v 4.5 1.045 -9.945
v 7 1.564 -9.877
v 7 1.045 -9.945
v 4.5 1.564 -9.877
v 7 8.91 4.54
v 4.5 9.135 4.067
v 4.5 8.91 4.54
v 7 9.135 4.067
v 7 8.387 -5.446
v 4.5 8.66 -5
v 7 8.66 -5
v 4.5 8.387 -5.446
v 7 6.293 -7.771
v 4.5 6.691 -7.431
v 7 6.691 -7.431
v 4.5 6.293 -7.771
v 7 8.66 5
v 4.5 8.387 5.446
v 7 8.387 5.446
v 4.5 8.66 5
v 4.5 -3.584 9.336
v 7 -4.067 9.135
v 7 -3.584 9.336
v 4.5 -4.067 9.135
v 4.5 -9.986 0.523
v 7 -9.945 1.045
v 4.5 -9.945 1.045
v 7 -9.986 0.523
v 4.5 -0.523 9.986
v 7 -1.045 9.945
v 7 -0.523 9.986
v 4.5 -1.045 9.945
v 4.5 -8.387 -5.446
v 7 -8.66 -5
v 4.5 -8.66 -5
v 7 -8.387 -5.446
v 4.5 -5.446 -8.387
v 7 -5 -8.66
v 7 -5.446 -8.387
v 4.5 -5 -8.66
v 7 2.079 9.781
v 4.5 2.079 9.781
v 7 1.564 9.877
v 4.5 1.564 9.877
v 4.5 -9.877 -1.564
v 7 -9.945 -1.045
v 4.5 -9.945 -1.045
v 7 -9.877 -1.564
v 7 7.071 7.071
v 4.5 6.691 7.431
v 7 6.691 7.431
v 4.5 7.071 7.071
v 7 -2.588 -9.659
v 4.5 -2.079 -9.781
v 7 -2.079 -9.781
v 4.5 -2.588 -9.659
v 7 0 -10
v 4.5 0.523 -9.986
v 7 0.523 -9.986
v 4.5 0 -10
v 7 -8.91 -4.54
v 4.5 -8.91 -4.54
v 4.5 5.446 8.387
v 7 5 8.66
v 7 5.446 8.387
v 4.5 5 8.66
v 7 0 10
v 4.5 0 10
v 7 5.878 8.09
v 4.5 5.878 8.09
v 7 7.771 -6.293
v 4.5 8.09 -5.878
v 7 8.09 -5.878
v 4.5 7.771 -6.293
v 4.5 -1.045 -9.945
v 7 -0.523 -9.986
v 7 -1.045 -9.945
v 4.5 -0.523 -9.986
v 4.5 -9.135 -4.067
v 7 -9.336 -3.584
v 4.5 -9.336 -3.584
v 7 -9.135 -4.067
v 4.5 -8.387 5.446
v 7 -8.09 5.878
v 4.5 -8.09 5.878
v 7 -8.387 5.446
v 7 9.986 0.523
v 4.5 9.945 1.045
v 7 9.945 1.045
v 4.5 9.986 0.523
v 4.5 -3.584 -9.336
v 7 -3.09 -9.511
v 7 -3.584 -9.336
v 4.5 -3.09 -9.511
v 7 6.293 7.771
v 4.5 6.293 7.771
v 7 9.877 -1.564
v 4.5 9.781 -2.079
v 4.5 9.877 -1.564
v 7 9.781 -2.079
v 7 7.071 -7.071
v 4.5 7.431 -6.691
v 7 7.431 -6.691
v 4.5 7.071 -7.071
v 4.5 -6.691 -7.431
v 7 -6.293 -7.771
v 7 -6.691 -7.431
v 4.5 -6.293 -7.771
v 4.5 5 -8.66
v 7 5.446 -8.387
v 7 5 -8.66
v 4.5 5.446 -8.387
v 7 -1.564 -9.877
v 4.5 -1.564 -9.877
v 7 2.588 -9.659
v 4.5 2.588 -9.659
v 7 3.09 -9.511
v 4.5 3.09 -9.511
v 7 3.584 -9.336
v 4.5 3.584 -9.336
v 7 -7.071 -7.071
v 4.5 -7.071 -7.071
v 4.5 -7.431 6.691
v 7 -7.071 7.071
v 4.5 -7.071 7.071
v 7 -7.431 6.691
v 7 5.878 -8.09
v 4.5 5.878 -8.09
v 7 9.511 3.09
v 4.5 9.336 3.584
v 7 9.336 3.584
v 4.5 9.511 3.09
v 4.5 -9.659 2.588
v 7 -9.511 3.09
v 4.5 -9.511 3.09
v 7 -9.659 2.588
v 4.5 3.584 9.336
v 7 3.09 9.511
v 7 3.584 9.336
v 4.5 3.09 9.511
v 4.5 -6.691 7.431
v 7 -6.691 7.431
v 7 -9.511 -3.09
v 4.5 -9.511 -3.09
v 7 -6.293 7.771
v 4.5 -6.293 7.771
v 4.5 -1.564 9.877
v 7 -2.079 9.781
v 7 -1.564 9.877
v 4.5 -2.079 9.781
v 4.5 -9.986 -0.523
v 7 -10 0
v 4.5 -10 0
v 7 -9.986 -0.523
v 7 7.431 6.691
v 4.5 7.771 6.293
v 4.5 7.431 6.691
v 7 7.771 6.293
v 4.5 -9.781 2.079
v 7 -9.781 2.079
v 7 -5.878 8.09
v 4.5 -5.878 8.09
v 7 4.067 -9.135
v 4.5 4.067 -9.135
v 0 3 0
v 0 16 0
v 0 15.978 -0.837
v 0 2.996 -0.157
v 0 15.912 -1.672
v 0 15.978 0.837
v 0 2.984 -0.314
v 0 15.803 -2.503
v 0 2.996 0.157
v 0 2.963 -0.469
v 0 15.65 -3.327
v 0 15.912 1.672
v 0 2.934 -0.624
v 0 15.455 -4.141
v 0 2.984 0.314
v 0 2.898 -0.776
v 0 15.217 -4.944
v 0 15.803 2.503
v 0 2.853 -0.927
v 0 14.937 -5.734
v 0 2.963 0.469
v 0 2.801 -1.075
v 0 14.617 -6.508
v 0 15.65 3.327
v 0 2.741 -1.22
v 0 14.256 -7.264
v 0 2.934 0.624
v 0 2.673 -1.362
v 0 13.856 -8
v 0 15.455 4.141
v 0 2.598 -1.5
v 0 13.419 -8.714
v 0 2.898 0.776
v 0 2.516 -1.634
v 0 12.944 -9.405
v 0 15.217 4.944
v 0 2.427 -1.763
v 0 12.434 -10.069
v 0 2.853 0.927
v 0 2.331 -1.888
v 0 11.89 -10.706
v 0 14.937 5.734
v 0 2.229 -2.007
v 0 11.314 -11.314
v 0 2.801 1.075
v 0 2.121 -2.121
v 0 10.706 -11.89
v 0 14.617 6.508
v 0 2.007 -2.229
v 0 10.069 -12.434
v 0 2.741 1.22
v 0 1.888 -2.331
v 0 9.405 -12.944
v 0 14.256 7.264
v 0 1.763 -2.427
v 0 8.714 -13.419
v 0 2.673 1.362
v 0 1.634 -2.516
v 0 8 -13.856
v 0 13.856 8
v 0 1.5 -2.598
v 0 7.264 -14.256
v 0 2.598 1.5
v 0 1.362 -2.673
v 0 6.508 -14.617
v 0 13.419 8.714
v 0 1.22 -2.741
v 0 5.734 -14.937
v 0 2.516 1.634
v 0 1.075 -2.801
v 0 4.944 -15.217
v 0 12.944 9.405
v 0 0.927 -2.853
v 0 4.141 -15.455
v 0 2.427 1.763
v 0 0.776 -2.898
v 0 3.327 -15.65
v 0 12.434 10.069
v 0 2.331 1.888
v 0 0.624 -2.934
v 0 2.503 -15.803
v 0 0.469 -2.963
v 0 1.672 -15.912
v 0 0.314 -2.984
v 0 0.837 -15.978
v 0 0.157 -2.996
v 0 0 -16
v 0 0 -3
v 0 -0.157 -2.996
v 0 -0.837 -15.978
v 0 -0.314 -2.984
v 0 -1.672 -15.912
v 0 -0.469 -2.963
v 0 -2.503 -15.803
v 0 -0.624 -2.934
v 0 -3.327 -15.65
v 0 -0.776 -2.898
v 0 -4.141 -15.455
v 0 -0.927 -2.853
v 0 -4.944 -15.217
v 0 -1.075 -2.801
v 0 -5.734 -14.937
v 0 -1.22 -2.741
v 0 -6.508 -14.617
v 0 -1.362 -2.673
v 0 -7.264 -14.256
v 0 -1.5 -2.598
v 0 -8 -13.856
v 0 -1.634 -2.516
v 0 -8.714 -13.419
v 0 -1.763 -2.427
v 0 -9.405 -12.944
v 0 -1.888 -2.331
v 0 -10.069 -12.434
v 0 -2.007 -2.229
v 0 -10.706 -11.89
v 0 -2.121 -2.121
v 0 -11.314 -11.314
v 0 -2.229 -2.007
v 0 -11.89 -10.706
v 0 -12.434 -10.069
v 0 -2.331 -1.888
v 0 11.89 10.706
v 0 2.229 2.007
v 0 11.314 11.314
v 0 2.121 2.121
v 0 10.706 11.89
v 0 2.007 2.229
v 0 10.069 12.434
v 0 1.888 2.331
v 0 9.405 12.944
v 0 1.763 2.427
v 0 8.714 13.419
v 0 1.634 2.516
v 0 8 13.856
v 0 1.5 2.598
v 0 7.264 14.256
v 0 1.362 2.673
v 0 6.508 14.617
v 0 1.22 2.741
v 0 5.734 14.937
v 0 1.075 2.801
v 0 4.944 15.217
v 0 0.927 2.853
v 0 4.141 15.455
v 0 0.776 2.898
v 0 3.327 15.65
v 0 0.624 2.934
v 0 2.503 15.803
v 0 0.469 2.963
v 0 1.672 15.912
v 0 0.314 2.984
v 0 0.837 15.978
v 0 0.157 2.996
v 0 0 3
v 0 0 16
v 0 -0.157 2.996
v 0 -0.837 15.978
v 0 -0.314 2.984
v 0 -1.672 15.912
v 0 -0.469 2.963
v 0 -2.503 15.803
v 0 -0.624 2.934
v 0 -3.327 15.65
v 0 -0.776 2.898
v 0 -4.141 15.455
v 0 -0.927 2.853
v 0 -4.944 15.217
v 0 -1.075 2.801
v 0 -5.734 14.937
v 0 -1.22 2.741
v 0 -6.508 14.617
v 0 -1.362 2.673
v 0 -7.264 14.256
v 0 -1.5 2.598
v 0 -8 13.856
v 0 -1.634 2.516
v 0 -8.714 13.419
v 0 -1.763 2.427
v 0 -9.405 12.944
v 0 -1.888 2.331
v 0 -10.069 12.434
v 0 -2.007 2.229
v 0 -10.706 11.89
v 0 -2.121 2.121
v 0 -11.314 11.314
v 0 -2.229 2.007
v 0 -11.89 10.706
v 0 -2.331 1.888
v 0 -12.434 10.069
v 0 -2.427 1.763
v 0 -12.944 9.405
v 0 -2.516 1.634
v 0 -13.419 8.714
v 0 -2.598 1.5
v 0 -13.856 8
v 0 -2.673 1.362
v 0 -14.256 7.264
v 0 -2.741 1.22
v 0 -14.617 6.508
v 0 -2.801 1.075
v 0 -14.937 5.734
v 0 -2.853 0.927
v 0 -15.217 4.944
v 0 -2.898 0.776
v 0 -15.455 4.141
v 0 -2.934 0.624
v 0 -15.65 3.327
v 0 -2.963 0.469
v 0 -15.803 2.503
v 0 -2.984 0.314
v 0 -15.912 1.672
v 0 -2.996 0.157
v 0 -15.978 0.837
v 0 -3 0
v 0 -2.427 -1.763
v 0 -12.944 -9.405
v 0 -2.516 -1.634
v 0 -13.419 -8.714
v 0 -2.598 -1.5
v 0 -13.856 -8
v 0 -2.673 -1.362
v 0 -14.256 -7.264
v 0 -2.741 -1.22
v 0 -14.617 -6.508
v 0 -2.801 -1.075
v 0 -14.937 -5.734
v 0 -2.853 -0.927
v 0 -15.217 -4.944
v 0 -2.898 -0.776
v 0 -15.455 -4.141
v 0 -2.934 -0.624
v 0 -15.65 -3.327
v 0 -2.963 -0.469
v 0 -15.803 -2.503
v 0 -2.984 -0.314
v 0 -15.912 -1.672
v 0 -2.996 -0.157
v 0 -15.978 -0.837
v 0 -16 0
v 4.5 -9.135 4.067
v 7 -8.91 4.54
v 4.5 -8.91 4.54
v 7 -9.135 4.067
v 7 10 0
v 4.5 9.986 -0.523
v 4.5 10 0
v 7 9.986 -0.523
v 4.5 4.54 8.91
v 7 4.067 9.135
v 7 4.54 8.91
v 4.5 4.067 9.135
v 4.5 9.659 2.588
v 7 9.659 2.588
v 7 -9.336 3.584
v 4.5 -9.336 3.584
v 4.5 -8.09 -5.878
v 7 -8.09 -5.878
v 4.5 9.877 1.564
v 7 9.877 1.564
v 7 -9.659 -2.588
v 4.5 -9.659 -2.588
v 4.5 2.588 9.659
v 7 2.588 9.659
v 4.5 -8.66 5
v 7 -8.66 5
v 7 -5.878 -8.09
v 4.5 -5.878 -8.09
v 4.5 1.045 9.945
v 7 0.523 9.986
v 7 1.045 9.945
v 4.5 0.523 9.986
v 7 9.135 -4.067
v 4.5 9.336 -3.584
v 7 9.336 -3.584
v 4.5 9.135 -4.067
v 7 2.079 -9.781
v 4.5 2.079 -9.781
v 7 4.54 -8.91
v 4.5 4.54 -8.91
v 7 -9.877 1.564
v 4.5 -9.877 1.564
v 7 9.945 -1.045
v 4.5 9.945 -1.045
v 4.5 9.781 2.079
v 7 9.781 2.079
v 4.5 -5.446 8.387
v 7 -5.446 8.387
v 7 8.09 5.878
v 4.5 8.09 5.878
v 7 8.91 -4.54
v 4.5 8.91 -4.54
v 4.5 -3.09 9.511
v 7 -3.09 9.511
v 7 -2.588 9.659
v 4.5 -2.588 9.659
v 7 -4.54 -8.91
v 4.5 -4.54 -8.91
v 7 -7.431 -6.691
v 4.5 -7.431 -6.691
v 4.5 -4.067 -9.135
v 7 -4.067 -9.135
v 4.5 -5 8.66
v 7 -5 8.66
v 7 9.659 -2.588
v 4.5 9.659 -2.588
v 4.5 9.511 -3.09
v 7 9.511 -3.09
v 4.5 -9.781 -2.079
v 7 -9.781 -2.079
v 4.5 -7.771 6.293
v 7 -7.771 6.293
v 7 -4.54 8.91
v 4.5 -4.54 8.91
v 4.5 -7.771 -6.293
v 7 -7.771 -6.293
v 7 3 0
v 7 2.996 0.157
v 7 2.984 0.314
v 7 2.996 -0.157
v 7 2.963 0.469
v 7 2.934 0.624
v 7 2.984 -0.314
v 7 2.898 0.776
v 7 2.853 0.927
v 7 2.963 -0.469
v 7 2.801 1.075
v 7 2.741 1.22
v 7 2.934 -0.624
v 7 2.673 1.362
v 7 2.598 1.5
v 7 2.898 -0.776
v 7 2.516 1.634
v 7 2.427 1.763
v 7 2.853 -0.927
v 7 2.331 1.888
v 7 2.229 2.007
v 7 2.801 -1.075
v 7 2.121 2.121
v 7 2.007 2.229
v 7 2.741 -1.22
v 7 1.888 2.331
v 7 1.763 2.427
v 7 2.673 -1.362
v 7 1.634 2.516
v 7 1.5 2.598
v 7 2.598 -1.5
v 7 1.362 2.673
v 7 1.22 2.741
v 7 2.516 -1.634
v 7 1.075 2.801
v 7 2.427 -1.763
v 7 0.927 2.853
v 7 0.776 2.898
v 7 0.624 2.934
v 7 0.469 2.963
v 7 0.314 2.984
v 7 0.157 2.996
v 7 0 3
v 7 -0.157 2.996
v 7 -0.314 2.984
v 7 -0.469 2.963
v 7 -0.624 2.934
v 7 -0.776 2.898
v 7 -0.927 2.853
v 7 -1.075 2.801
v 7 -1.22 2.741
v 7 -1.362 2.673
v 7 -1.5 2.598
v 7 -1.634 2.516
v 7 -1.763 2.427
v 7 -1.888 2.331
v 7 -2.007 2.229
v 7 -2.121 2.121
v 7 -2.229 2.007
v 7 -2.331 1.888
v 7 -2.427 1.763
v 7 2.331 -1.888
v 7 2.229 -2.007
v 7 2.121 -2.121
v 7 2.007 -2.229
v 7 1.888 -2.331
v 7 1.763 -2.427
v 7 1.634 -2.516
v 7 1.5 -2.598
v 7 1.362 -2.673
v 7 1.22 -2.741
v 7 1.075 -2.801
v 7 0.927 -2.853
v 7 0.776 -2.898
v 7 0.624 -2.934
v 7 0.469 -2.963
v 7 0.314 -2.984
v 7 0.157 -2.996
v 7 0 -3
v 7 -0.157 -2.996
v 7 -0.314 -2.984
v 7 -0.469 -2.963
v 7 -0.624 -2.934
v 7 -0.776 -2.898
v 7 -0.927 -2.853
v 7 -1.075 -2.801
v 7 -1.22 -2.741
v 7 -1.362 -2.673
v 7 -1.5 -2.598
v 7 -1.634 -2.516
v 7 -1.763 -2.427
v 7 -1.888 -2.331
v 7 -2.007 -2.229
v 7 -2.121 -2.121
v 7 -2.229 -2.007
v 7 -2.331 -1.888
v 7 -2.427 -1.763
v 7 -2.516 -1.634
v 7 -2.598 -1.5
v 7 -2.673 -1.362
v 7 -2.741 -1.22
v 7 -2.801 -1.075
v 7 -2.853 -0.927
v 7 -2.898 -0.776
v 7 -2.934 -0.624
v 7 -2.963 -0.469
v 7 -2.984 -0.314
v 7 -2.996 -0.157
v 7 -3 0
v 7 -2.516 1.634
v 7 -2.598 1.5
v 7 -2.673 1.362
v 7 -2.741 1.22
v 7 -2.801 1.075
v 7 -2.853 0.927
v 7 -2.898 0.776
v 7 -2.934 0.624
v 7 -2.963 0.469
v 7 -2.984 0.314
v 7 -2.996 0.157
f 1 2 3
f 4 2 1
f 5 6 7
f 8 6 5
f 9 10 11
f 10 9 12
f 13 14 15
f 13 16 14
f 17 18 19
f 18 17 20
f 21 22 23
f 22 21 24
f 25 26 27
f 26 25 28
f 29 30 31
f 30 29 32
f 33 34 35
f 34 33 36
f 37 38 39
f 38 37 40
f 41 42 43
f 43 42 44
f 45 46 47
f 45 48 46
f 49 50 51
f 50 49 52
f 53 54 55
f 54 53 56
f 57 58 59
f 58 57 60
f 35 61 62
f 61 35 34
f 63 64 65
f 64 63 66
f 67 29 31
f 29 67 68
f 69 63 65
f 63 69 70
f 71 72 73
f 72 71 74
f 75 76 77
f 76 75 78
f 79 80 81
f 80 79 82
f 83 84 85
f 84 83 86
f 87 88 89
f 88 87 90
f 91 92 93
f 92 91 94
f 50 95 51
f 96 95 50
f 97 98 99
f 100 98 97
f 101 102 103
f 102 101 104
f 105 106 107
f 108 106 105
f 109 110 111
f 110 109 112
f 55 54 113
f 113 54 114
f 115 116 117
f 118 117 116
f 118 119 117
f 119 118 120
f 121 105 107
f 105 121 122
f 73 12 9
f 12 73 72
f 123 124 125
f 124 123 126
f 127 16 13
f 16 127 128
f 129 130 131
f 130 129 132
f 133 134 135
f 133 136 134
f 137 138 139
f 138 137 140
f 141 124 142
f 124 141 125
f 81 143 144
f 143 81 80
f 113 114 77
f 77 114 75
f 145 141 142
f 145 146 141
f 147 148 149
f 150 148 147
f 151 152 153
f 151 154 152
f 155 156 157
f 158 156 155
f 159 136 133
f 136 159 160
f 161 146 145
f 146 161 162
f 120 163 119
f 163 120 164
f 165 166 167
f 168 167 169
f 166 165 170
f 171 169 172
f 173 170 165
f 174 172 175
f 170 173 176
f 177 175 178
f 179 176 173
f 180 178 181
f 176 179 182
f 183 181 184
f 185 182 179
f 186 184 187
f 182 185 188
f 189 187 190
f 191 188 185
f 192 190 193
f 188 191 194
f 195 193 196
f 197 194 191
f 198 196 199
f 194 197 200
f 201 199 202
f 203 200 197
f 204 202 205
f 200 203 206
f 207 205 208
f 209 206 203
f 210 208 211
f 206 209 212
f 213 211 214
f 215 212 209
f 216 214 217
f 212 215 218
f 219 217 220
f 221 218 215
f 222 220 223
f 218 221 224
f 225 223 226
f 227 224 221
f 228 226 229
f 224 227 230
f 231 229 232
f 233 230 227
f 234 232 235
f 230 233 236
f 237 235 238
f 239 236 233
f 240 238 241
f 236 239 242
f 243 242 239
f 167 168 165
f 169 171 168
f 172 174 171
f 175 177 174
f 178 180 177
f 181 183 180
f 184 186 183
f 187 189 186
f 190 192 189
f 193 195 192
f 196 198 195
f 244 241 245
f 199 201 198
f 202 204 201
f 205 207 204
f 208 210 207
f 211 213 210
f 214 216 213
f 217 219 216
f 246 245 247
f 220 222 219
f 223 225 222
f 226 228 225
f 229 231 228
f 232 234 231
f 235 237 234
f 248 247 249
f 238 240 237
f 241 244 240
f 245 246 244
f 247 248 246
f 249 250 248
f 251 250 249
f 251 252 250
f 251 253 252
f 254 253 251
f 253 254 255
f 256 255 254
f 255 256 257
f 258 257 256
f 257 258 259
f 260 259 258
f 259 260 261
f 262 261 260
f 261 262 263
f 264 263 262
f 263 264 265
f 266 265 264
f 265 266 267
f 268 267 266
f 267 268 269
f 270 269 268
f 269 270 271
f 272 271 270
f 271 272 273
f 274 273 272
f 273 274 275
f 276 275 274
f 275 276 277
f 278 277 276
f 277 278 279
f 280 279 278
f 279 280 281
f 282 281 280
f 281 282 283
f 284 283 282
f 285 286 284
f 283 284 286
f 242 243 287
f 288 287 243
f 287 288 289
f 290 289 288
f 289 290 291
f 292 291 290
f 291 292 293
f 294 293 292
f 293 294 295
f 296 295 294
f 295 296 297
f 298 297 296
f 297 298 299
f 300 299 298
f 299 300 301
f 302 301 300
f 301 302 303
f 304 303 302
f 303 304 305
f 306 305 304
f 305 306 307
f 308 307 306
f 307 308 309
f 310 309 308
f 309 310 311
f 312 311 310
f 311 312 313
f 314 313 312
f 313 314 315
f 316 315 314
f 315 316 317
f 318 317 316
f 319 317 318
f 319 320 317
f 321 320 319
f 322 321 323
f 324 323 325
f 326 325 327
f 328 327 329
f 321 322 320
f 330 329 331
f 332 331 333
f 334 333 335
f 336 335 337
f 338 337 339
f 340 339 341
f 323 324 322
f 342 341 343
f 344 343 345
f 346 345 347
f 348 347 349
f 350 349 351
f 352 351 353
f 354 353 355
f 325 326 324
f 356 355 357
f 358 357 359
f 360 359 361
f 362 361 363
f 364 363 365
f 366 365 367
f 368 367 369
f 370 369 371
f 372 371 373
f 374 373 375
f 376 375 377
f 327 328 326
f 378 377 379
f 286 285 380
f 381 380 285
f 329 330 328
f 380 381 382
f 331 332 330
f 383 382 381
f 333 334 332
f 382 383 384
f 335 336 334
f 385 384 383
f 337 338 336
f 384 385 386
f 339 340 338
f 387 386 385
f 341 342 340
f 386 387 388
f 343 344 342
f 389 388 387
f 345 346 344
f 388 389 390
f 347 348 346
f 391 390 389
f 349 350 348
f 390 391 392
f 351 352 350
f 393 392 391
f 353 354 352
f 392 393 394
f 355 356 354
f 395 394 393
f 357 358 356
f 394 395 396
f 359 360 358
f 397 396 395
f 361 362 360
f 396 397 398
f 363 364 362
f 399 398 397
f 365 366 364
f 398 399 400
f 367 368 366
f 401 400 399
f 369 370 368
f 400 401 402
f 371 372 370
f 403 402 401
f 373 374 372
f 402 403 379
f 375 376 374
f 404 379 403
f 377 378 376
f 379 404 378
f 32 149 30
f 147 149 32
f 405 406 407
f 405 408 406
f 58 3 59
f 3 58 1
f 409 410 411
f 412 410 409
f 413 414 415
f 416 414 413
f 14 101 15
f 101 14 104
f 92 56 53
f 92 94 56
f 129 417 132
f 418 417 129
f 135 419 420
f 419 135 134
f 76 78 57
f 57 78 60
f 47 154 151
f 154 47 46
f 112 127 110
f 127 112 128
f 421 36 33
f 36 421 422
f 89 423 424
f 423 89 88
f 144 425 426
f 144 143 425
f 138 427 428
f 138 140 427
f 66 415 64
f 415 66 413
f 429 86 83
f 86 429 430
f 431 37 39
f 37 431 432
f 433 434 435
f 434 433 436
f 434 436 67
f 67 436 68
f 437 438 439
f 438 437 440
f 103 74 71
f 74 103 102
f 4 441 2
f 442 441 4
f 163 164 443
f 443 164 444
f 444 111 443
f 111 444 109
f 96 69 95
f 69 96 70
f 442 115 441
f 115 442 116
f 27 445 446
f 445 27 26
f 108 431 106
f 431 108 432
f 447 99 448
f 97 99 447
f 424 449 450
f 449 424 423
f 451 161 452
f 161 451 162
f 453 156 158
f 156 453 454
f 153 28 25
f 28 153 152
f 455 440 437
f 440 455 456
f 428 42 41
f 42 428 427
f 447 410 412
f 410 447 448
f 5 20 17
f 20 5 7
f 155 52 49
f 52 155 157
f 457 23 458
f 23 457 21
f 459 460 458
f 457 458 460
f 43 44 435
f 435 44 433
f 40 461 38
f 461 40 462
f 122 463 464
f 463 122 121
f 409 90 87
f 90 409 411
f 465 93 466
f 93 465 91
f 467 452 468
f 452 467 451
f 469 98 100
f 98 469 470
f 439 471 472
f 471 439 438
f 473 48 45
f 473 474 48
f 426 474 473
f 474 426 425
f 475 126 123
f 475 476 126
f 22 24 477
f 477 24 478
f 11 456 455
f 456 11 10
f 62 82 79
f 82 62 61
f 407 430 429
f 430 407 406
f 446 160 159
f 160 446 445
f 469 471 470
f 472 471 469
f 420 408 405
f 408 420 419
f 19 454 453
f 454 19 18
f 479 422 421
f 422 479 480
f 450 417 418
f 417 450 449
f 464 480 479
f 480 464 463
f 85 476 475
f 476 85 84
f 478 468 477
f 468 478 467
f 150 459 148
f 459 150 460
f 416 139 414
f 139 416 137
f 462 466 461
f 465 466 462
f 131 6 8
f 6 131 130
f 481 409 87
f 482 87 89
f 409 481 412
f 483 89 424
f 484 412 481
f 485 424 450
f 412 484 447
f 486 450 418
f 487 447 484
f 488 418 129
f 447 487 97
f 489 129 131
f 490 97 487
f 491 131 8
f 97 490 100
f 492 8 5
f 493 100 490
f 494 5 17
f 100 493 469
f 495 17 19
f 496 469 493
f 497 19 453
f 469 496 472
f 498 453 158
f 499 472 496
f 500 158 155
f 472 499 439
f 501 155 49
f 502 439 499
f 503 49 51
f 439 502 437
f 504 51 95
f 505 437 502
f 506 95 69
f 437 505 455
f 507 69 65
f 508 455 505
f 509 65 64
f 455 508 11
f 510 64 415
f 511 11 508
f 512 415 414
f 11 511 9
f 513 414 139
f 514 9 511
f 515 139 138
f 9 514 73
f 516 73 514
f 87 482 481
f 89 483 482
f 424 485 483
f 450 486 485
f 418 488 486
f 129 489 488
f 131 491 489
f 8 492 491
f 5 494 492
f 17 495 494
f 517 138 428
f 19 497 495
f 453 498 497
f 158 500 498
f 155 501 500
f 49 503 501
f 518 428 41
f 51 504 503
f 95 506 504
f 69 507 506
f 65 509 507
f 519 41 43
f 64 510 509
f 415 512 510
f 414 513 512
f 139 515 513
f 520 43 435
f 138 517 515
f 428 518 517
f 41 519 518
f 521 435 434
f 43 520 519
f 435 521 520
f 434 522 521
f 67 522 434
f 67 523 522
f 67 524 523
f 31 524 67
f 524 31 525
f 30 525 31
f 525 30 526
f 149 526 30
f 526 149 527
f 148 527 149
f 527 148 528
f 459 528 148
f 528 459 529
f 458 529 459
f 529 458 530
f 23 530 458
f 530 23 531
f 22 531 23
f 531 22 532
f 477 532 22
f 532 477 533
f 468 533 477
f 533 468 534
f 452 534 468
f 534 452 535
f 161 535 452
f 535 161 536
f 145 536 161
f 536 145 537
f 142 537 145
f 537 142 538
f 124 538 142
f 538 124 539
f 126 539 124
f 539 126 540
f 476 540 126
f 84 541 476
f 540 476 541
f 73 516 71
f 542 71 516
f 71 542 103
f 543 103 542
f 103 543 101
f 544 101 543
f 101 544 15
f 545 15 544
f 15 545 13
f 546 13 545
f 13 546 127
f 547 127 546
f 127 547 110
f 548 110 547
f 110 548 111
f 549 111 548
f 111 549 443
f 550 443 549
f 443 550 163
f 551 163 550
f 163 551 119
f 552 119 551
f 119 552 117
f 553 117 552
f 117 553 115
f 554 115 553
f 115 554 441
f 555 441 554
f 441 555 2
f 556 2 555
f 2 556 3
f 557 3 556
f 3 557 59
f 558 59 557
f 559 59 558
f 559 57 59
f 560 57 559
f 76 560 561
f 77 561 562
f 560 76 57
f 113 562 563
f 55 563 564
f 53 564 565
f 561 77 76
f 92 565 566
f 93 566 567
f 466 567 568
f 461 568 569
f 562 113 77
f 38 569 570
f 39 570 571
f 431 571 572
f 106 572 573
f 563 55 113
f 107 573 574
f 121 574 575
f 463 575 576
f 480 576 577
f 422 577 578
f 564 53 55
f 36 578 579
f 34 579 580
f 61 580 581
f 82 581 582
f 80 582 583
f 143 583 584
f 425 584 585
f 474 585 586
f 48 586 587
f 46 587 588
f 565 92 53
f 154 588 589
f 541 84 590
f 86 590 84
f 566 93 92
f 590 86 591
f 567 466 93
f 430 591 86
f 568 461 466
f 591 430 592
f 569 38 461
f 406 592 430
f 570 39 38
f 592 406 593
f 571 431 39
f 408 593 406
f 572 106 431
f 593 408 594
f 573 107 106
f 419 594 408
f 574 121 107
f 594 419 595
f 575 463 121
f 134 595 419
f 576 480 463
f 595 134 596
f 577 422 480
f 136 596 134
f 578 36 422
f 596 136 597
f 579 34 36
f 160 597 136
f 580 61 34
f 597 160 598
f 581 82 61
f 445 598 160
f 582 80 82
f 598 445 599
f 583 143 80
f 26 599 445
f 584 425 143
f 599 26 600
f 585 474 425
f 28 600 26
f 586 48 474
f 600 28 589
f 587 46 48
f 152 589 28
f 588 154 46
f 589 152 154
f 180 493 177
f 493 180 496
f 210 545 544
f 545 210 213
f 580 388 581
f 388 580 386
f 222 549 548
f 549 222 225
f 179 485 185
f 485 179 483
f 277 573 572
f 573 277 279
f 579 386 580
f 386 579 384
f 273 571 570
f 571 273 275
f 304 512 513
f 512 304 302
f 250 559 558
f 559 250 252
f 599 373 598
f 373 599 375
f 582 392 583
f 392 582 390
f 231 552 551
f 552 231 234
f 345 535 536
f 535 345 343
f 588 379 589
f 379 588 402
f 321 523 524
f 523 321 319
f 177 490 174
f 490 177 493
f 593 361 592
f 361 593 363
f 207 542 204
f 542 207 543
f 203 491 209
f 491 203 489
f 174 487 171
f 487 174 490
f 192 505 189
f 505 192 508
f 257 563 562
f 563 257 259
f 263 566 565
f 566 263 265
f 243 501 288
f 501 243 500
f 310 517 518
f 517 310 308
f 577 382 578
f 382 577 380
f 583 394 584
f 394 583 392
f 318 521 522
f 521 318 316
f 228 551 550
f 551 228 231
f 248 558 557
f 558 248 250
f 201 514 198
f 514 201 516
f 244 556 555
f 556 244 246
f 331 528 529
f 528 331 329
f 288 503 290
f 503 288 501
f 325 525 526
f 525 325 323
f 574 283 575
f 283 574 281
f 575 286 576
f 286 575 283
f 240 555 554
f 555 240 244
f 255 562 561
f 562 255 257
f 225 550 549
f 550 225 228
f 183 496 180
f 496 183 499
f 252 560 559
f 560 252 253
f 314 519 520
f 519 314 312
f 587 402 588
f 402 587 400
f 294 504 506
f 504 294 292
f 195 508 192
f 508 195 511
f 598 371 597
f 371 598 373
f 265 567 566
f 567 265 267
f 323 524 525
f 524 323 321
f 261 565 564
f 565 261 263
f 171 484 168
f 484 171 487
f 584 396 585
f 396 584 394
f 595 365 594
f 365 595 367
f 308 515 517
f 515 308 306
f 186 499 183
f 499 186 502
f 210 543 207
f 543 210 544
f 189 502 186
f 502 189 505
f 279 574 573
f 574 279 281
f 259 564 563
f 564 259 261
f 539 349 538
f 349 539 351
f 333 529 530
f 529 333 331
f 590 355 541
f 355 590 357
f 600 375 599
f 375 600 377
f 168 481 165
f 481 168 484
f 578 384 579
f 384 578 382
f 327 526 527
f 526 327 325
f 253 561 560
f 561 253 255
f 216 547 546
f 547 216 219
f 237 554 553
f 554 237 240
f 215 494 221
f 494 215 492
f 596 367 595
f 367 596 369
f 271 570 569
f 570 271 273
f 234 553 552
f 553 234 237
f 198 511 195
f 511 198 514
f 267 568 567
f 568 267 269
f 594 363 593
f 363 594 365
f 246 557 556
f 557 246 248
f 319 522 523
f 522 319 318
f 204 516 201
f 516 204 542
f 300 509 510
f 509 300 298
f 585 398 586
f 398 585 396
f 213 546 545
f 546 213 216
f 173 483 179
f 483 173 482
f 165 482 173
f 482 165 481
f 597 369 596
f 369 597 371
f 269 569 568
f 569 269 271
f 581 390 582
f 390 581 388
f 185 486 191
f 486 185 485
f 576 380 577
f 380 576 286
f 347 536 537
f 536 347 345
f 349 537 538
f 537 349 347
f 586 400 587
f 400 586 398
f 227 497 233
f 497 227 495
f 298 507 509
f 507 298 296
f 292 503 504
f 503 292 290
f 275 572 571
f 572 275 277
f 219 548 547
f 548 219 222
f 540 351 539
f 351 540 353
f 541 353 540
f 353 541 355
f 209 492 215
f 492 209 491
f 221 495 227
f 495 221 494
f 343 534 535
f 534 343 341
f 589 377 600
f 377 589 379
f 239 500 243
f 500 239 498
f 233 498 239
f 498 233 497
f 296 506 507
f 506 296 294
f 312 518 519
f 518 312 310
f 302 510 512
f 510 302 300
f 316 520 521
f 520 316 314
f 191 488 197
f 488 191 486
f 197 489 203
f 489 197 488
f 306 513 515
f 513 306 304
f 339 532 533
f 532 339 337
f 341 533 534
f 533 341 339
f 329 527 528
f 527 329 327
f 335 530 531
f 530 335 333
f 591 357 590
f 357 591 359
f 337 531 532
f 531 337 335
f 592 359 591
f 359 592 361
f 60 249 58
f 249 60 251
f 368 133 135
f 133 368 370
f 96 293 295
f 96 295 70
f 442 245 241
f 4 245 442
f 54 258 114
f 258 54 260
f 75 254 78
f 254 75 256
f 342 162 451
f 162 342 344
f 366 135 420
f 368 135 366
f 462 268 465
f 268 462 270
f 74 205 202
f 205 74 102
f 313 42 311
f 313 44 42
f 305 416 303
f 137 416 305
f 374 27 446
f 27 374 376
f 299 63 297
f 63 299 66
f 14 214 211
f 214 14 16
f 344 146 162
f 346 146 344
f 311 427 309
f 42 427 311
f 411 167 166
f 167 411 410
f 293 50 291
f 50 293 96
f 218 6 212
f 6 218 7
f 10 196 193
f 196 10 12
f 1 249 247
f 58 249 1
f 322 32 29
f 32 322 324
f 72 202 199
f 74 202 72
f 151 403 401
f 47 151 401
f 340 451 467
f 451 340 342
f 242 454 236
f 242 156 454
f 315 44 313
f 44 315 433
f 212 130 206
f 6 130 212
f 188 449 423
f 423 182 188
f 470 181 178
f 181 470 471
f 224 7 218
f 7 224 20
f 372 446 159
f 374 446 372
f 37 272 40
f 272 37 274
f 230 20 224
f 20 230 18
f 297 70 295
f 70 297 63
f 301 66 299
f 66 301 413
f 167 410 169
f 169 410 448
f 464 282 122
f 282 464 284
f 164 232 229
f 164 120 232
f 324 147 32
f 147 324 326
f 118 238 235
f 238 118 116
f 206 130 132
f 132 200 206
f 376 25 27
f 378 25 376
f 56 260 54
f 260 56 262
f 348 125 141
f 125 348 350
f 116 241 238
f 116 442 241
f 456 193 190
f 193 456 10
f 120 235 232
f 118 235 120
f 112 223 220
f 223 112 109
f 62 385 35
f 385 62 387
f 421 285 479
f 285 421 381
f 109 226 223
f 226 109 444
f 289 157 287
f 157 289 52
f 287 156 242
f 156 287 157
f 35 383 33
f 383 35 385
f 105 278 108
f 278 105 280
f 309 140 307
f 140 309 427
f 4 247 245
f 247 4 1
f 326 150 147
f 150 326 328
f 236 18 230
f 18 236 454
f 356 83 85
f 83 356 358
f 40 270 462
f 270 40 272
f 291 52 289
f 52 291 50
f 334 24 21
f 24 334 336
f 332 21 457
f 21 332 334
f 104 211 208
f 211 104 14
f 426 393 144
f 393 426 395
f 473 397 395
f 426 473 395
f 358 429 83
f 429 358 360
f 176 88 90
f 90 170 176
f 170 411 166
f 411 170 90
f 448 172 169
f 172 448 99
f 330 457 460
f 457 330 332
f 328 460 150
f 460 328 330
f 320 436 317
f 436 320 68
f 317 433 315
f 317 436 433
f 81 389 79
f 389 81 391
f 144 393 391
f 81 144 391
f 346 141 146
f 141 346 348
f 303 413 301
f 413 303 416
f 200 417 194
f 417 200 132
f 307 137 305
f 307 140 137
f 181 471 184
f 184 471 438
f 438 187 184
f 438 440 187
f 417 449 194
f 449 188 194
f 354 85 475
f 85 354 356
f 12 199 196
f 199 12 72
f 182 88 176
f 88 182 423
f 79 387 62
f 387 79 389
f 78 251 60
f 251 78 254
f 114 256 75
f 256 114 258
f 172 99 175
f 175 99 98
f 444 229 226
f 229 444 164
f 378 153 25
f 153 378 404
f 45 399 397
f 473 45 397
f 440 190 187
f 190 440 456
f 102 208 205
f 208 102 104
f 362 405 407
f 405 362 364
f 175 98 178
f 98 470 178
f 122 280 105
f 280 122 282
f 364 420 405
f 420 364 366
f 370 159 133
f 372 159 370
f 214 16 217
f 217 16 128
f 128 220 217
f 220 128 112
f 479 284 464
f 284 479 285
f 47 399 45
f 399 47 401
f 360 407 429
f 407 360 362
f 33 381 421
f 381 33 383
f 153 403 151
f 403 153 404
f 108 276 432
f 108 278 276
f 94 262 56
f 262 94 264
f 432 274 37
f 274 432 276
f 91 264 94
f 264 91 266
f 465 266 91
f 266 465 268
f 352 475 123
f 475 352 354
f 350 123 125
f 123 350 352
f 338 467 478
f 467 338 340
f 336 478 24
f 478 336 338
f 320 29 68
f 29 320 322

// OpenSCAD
union() {
    difference() { 
        rotate([0,90,0]){
            cylinder($fn = 120, h=7, r=20/2, center=false);
        }

        rotate([0,90,0]){
            cylinder($fn = 120, h=20, r=6/2, center=true);
        }
    }
    
    difference() { 
        union(){
            translate([0,0,0]){
                rotate([0,90,0]){
                    cylinder($fn = 120, h=24/2, r1=32/2, r2=0);
                }
                
              /*  rotate([0,-90,0]){
                    cylinder($fn = 120, h=10/2, r1=30/2, r2=0);
                }*/
            }
            
        }
        
        rotate([0,90,0]){
            cylinder($fn = 120, h=45, r=20/2, center=true);
        }
    }
}
